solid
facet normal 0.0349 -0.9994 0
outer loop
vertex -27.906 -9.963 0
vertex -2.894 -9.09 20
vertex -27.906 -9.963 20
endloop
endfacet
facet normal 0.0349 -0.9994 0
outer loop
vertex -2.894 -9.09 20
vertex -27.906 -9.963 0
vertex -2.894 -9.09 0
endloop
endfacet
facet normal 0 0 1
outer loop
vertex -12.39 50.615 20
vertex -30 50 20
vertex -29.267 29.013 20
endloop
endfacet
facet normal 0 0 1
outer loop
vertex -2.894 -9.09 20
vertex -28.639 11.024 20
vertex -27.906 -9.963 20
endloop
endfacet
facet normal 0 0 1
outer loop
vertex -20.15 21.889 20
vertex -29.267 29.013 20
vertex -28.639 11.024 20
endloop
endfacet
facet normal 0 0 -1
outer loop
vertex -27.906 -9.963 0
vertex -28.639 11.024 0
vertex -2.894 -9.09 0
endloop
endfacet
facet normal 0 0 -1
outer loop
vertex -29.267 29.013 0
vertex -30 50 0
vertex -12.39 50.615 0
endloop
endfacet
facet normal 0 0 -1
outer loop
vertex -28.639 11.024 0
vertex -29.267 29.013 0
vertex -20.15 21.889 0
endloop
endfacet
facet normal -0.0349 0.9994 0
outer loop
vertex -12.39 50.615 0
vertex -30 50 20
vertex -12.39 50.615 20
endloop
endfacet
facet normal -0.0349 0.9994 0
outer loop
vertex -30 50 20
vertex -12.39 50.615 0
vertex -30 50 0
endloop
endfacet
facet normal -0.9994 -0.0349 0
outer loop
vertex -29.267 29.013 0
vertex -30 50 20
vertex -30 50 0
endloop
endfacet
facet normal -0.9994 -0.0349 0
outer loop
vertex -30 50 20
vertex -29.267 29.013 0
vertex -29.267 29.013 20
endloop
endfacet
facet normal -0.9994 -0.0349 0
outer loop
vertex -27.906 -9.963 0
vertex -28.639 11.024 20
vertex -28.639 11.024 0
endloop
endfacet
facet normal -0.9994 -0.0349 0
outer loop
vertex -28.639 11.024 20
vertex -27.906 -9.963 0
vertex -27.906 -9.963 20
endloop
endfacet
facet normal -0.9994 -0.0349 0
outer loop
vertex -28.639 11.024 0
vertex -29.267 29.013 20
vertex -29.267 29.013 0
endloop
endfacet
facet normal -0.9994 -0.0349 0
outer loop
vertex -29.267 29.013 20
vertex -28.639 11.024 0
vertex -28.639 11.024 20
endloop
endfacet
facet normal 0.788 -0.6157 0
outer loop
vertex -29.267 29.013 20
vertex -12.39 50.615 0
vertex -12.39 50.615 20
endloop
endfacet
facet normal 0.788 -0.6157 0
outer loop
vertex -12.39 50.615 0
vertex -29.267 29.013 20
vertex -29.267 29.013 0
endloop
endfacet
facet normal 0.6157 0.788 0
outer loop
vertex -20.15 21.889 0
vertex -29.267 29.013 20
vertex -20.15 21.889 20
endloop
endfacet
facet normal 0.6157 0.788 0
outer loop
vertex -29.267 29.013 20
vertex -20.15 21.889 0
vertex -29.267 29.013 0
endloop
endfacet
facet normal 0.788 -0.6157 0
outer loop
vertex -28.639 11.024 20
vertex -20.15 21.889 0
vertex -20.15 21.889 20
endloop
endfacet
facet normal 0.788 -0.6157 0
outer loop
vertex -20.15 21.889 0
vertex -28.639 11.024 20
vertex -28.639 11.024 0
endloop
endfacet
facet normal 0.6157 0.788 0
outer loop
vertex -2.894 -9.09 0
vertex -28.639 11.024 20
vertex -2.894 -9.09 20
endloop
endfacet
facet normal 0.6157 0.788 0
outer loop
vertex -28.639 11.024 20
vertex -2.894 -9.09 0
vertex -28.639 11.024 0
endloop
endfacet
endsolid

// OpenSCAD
translate([-30,50,0])
scale([3,3,1])
rotate([0,0,-88]) {
    difference() {
        cube([20, 20, 20]);
        translate([7, 0, -1]) {
            rotate([0,0,50]) {
                cube([30, 30, 30]);
            }
        }
        translate([13, 0, -1]) {
            rotate([0,0,50]) {
                cube([30, 30, 30]);
            }
        }
    }
}
